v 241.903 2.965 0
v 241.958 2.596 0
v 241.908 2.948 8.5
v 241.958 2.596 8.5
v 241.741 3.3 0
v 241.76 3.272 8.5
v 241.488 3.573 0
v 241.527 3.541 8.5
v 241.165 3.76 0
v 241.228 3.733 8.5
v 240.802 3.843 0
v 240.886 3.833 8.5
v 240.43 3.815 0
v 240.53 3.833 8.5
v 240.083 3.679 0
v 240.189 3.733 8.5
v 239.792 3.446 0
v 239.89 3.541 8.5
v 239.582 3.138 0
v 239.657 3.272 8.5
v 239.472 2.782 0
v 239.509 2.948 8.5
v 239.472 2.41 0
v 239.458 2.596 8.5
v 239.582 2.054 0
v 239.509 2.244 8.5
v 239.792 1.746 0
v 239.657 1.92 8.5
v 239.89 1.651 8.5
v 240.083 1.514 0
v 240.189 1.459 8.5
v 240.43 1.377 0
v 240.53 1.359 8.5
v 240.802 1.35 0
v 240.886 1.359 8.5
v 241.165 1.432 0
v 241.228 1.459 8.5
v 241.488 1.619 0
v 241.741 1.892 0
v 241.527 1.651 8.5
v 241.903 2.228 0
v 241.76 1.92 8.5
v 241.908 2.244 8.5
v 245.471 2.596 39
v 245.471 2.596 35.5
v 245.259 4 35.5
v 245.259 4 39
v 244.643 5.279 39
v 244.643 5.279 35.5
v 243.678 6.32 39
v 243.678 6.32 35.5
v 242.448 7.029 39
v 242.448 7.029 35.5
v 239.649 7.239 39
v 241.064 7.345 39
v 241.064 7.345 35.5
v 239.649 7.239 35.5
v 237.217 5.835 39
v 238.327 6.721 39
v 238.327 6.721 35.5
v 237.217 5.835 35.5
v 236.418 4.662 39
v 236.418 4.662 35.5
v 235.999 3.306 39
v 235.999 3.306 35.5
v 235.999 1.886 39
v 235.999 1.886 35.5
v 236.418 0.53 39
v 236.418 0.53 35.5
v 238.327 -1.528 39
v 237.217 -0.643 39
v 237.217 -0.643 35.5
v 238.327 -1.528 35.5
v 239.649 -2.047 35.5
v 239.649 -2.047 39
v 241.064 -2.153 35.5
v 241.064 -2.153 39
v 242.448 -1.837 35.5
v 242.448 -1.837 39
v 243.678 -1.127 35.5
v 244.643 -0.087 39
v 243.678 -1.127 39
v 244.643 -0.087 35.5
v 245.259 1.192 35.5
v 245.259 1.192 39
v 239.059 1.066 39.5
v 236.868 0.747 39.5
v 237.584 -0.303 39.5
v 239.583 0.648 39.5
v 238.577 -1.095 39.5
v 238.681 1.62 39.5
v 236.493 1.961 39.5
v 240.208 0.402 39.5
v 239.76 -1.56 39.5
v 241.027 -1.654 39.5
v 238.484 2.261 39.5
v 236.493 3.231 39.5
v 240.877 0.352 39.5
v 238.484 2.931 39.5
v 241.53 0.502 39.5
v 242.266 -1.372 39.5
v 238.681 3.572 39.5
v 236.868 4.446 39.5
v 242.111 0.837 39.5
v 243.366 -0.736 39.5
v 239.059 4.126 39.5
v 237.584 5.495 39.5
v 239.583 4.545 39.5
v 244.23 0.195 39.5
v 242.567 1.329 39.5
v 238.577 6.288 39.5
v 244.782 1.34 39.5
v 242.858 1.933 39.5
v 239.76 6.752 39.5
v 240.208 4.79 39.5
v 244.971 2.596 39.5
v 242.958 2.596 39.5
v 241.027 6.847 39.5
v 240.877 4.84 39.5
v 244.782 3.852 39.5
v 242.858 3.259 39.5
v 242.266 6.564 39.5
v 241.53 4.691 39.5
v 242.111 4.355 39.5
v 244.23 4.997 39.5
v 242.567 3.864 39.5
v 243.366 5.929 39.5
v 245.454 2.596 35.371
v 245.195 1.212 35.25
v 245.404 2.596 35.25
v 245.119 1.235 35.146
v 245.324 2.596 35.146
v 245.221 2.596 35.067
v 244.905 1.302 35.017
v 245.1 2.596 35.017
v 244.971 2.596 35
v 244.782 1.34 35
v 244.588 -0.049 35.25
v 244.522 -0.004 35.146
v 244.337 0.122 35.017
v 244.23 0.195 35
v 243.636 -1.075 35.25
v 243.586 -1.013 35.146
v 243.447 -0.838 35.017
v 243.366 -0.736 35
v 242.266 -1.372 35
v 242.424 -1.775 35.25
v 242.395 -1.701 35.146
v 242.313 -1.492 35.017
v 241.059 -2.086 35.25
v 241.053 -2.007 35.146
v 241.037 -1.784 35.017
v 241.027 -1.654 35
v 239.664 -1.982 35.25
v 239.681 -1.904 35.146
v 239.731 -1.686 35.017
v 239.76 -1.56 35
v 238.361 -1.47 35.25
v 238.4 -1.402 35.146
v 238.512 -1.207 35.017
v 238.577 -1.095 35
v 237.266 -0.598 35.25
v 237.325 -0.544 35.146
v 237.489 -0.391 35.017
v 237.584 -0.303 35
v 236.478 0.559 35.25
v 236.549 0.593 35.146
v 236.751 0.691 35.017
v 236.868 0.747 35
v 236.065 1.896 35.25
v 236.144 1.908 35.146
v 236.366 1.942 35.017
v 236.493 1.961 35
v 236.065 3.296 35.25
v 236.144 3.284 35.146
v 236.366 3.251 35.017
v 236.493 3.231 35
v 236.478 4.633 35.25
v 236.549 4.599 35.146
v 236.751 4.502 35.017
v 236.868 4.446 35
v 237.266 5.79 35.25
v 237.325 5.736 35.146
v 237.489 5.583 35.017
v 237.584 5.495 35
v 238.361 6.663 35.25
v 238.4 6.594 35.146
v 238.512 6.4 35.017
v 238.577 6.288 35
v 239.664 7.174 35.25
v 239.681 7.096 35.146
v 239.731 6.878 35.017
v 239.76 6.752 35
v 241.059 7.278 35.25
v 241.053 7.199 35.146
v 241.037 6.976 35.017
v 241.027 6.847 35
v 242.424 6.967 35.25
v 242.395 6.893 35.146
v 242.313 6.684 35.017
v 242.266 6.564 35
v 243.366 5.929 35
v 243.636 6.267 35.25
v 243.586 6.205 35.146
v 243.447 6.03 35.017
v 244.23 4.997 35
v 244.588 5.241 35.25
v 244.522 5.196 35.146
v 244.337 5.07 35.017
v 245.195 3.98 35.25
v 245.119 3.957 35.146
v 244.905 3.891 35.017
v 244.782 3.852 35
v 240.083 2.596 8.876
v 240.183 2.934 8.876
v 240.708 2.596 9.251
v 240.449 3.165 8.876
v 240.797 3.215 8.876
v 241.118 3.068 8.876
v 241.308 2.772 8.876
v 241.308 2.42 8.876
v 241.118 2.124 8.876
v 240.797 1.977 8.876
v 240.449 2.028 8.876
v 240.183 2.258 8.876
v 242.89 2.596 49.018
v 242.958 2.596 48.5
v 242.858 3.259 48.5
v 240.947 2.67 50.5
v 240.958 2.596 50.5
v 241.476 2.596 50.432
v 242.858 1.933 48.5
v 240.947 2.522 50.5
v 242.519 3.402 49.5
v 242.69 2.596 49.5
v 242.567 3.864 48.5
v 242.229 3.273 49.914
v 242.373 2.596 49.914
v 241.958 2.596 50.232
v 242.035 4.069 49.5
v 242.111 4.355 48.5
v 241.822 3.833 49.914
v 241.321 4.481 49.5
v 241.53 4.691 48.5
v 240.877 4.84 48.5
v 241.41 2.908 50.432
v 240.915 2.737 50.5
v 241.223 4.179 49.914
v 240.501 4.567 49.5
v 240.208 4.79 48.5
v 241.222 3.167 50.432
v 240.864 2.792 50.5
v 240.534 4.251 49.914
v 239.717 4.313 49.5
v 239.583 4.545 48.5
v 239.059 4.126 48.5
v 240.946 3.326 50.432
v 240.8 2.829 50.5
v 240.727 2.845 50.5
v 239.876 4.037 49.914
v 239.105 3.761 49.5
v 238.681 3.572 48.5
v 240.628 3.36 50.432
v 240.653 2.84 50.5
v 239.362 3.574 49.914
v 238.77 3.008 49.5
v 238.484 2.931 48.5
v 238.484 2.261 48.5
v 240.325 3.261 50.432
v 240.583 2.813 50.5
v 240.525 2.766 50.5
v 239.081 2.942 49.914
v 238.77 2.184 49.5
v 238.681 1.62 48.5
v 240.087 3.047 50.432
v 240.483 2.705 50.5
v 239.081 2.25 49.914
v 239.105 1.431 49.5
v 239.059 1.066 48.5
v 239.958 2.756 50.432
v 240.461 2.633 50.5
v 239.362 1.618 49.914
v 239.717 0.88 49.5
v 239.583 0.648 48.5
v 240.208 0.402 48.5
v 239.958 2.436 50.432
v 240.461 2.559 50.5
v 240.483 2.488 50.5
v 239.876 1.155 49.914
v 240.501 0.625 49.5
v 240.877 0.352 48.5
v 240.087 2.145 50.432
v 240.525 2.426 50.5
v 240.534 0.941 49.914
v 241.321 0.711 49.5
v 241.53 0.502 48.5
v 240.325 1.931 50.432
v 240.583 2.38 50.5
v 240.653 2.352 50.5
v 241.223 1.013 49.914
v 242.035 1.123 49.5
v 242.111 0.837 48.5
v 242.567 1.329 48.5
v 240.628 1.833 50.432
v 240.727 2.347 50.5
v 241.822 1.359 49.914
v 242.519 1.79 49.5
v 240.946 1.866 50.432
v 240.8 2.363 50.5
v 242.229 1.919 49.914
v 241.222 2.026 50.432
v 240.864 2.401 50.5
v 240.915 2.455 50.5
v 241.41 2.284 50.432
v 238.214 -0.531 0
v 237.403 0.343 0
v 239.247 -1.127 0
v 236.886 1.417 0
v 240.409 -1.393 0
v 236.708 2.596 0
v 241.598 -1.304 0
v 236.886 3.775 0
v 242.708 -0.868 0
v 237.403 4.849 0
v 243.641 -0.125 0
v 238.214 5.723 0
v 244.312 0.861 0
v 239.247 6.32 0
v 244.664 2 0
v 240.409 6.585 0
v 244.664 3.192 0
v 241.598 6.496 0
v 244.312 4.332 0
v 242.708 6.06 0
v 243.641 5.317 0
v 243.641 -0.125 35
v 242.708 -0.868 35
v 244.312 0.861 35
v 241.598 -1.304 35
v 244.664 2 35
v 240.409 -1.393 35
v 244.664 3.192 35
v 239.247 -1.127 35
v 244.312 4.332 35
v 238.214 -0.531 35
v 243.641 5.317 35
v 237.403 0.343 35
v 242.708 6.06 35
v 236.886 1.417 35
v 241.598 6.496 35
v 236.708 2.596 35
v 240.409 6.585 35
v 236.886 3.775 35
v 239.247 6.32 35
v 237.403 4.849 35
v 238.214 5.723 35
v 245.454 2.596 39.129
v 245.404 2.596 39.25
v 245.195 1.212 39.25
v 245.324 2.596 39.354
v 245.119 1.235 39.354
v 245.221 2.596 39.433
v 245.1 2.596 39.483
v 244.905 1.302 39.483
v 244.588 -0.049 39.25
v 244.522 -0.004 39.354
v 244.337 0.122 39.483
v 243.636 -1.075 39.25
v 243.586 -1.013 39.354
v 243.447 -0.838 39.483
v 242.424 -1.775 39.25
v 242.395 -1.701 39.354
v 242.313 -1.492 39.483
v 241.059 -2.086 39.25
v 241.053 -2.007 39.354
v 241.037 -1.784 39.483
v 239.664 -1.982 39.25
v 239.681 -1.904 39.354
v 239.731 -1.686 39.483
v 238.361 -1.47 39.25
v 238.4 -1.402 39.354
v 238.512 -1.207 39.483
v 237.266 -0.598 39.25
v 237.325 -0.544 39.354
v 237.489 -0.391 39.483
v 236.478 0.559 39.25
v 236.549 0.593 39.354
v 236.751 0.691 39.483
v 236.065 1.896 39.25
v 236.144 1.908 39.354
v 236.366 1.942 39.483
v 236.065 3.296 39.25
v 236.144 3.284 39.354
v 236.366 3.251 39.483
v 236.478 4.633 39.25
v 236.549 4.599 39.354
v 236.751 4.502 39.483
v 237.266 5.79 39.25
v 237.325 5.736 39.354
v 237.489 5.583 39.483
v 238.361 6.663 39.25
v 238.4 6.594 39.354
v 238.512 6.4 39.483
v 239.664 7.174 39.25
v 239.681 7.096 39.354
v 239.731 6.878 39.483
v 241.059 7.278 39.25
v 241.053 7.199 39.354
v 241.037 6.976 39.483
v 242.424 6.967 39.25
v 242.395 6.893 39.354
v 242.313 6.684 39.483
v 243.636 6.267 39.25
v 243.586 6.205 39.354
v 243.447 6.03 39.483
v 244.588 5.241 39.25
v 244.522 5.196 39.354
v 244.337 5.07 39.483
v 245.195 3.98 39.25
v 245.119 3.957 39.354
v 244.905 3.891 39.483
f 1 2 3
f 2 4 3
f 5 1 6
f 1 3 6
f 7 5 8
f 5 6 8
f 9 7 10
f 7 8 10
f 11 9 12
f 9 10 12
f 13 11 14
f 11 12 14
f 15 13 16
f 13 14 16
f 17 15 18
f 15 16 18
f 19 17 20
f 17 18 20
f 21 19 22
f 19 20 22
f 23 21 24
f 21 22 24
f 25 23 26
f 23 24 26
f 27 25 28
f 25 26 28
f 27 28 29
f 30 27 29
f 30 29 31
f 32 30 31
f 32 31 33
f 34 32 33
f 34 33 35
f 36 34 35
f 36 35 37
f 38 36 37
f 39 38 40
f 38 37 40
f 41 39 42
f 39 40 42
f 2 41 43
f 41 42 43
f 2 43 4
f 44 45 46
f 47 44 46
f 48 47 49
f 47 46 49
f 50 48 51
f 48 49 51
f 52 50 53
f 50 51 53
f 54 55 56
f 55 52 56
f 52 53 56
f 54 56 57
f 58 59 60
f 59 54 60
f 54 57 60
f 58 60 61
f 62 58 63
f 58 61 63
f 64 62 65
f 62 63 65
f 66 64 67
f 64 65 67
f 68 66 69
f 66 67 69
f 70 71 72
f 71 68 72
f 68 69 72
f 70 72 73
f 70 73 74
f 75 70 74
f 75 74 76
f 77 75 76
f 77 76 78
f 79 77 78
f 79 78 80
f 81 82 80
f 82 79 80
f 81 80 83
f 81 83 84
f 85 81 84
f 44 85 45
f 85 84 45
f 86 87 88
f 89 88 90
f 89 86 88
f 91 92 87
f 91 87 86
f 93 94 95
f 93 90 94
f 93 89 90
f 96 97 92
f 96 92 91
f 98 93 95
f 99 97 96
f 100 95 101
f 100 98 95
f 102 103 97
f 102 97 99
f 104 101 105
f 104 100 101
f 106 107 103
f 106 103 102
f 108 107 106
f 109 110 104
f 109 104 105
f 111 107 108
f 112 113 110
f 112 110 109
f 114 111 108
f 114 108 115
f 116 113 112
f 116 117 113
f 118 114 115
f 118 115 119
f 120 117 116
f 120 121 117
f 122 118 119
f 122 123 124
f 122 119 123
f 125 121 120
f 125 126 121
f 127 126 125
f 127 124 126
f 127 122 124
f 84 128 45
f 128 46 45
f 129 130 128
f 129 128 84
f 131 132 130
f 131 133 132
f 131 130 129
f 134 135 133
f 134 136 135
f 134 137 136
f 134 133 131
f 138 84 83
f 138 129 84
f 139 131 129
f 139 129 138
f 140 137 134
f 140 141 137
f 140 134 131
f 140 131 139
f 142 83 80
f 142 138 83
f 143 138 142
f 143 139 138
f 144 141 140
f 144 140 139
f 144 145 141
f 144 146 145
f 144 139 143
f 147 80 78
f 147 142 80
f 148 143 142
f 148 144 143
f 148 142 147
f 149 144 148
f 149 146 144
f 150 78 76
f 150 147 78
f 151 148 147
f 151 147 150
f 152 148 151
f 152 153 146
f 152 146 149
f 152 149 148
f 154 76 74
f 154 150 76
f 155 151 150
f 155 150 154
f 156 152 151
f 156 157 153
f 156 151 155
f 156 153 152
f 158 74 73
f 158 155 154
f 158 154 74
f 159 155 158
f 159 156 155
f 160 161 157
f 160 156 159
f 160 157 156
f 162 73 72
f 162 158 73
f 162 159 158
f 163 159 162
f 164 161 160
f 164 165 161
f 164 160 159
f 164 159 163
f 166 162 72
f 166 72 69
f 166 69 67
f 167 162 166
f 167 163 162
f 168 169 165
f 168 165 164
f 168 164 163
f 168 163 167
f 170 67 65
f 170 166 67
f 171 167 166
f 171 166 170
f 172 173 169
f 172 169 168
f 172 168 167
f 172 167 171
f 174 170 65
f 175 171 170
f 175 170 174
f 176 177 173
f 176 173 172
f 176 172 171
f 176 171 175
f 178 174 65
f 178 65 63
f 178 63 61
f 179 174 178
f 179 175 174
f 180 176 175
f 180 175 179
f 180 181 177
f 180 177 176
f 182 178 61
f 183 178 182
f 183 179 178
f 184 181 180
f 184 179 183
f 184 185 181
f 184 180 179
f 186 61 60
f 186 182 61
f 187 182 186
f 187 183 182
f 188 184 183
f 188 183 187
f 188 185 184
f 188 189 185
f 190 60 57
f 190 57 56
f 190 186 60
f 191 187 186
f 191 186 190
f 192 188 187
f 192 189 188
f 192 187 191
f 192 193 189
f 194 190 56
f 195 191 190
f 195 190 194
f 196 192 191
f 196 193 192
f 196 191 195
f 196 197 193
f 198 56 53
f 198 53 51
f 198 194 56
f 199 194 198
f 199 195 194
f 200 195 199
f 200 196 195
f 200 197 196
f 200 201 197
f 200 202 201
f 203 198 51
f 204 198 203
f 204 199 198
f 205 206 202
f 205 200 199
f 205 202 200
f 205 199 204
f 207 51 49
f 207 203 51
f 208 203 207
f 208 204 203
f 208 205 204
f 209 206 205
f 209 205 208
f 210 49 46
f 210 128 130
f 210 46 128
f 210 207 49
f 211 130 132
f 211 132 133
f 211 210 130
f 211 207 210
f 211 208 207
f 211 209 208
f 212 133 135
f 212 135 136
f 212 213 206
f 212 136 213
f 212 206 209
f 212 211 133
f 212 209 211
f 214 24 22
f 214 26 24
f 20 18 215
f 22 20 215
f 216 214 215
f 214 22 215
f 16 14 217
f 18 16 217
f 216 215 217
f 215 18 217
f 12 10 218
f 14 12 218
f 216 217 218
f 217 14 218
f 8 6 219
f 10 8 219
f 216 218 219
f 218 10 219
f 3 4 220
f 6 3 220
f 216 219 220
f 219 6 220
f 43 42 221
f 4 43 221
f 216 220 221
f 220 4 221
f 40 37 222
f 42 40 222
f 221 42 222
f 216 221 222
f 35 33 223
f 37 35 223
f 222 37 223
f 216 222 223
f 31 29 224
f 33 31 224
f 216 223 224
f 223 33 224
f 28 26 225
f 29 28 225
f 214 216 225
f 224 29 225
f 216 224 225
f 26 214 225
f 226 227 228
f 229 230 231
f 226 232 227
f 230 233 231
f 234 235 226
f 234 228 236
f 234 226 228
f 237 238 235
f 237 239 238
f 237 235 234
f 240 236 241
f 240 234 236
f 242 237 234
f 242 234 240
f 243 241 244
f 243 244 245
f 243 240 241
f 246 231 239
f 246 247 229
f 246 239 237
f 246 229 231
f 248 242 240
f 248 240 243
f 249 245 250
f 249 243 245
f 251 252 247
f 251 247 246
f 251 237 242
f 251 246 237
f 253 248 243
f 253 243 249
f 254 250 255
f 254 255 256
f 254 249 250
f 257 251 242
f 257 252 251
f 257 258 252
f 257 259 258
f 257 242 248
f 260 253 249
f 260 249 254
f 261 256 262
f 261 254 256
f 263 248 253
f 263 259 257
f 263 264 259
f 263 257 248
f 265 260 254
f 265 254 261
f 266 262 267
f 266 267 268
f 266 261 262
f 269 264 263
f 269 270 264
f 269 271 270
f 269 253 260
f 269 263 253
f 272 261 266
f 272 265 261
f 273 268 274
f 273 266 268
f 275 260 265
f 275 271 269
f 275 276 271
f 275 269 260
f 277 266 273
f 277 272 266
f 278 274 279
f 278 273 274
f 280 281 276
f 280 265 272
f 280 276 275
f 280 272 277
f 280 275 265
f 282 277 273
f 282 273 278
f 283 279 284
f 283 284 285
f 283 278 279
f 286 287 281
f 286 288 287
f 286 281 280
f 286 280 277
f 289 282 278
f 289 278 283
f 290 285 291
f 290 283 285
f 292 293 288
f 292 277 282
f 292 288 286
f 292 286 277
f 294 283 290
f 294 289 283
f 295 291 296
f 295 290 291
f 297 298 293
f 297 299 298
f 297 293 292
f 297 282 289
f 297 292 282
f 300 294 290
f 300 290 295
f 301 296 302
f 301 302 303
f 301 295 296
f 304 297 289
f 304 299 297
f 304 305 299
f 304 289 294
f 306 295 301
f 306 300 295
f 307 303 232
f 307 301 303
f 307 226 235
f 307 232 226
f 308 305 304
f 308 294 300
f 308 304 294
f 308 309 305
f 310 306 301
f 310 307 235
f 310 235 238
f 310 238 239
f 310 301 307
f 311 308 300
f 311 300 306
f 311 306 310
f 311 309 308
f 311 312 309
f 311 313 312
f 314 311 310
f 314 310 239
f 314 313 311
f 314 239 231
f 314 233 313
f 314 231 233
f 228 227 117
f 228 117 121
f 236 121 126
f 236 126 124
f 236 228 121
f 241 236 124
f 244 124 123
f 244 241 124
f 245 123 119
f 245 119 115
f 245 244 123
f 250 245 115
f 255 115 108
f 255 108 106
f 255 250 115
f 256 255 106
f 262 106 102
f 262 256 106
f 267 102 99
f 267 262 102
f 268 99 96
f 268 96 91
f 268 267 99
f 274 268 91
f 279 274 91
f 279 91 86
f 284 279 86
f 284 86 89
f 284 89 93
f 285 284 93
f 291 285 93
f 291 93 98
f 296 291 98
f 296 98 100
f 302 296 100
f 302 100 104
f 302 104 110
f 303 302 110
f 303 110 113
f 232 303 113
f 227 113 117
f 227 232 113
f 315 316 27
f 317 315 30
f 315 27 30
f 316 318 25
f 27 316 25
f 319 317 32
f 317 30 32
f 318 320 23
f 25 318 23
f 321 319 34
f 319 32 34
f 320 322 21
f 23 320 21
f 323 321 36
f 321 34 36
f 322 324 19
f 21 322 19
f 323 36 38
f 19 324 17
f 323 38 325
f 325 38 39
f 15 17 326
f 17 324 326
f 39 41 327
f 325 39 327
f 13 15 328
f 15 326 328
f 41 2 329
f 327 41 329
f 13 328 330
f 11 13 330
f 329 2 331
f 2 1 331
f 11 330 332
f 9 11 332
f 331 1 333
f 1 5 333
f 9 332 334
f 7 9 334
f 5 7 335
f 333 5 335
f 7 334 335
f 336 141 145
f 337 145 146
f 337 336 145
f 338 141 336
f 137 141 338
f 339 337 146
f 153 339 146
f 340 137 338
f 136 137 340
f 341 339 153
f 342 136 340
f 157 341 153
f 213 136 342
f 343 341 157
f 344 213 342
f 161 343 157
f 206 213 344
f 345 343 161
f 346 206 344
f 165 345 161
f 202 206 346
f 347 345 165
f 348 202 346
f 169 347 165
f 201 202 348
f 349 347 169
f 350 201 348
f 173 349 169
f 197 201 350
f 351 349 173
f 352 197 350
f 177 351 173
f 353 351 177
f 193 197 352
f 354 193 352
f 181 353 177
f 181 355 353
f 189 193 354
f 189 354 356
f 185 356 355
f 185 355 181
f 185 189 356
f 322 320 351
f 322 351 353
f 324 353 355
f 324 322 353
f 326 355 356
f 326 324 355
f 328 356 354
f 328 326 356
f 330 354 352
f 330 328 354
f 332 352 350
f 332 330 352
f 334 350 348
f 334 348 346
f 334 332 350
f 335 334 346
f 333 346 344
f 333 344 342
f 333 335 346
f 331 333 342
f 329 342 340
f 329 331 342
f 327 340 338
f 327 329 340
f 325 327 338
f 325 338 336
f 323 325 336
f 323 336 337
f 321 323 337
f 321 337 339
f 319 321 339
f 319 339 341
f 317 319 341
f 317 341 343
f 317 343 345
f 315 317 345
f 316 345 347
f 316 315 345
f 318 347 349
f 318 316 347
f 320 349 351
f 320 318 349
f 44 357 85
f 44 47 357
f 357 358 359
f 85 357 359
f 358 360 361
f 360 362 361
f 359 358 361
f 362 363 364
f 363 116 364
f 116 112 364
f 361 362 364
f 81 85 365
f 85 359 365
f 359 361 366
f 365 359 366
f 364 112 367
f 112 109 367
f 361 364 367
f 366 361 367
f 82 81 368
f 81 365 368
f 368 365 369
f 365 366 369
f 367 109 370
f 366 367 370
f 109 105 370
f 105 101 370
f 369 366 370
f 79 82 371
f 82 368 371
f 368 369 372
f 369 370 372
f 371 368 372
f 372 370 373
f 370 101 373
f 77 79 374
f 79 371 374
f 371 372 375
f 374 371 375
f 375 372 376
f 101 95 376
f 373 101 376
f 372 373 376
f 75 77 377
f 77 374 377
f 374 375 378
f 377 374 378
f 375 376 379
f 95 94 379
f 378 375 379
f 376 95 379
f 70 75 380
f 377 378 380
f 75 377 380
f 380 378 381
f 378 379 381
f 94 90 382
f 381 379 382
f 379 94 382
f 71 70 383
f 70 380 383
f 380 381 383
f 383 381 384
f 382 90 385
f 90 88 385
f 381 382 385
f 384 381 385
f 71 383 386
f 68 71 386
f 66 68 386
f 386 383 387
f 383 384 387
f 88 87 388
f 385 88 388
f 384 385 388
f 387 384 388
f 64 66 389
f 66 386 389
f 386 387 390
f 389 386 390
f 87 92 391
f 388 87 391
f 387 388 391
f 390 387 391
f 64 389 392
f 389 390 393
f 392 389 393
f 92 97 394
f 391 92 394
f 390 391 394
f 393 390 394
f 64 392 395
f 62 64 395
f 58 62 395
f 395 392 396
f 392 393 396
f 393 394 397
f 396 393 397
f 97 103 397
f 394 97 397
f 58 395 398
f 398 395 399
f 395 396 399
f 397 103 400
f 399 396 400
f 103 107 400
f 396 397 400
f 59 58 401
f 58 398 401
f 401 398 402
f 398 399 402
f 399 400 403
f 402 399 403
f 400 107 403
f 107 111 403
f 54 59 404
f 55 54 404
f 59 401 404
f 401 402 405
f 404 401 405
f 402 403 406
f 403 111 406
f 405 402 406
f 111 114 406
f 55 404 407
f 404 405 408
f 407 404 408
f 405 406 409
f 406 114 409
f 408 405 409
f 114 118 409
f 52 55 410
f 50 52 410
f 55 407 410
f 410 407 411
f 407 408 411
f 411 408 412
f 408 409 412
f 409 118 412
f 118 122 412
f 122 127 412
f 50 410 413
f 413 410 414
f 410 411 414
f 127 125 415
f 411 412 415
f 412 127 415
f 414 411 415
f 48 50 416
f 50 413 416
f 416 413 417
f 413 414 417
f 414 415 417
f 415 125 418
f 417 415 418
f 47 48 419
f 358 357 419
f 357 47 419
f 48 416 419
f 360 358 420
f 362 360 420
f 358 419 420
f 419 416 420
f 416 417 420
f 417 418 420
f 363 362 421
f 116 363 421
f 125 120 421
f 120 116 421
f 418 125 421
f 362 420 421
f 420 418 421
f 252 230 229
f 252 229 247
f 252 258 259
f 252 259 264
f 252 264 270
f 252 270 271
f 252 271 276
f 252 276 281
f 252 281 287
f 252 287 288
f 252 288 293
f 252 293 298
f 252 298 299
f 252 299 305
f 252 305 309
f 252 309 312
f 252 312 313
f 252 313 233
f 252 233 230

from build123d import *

# Parameters (mm, degrees)
ESBO_O1_R                     = 4.7625
RESSALTO_EXTRUS_O1_DEPTH      = 50.5
FURO_ROSCADO_DE_M3X0_52_D     = 2.5
FURO_ROSCADO_DE_M3X0_52_DEPTH = 8.5
FURO_ROSCADO_DE_M3X0_52_TIP   = 0.751075774
ESBO_O8_OUTSIDE_W             = 21.979
ESBO_O8_OUTSIDE_H             = 21.979
ESBO_O8_OUTSIDE_R             = 4
CORTE_EXTRUS_O1_DEPTH         = 35
ESBO_O10_OUTSIDE_W            = 21.979
ESBO_O10_OUTSIDE_H            = 21.979
ESBO_O10_OUTSIDE_R            = 2.25
CORTE_EXTRUS_O2_DEPTH         = 11
FILETE1_R                     = 0.5
FILETE2_R                     = 2


with BuildPart() as part:
    # Esboço1 → Ressalto-extrusão1 (new body)
    with BuildSketch(Plane.XY):
        with Locations((240.708388302, 2.596082859)):
            Circle(ESBO_O1_R)
    extrude(amount=RESSALTO_EXTRUS_O1_DEPTH)

    # Furo roscado de M3x0.52
    with Locations(Plane(origin=(0, 0, 0), x_dir=(-1, 0, 0), z_dir=(0, 0, -1))):
        with Locations((-240.708388302, 2.596082859)):
            Hole(FURO_ROSCADO_DE_M3X0_52_D / 2, depth=FURO_ROSCADO_DE_M3X0_52_DEPTH)
            with Locations((0, 0, -(FURO_ROSCADO_DE_M3X0_52_DEPTH + FURO_ROSCADO_DE_M3X0_52_TIP / 2))):  # 118° drill point
                Cone(0, FURO_ROSCADO_DE_M3X0_52_D / 2, FURO_ROSCADO_DE_M3X0_52_TIP, mode=Mode.SUBTRACT)

    # Esboço8 outside → Corte-extrusão1 (cut)
    with BuildSketch(Plane(origin=(0, 0, 0), x_dir=(-1, 0, 0), z_dir=(0, 0, -1))):
        with Locations((-240.7085, 2.5965)):
            Rectangle(ESBO_O8_OUTSIDE_W, ESBO_O8_OUTSIDE_H)
        with Locations((-240.708388302, 2.596082859)):
            Circle(ESBO_O8_OUTSIDE_R, mode=Mode.SUBTRACT)
    extrude(amount=-CORTE_EXTRUS_O1_DEPTH, mode=Mode.SUBTRACT)

    # Esboço10 outside → Corte-extrusão2 (cut)
    with BuildSketch(Plane.XY.offset(50.5)):
        with Locations((240.7085, 2.5965)):
            Rectangle(ESBO_O10_OUTSIDE_W, ESBO_O10_OUTSIDE_H)
        with Locations((240.708388302, 2.596082859)):
            Circle(ESBO_O10_OUTSIDE_R, mode=Mode.SUBTRACT)
    extrude(amount=-CORTE_EXTRUS_O2_DEPTH, mode=Mode.SUBTRACT)

    # Filete1
    filete1_edges = [part.edges().sort_by_distance(p)[0] for p in [
        (235.945888302, 2.596082859, 35),
        (235.945888302, 2.596082859, 39.5),
    ]]
    fillet(filete1_edges, radius=FILETE1_R)

    # Filete2
    filete2_edges = [part.edges().sort_by_distance(p)[0] for p in [
        (238.458388302, 2.596082859, 50.5),
    ]]
    fillet(filete2_edges, radius=FILETE2_R)


solid = part.part
